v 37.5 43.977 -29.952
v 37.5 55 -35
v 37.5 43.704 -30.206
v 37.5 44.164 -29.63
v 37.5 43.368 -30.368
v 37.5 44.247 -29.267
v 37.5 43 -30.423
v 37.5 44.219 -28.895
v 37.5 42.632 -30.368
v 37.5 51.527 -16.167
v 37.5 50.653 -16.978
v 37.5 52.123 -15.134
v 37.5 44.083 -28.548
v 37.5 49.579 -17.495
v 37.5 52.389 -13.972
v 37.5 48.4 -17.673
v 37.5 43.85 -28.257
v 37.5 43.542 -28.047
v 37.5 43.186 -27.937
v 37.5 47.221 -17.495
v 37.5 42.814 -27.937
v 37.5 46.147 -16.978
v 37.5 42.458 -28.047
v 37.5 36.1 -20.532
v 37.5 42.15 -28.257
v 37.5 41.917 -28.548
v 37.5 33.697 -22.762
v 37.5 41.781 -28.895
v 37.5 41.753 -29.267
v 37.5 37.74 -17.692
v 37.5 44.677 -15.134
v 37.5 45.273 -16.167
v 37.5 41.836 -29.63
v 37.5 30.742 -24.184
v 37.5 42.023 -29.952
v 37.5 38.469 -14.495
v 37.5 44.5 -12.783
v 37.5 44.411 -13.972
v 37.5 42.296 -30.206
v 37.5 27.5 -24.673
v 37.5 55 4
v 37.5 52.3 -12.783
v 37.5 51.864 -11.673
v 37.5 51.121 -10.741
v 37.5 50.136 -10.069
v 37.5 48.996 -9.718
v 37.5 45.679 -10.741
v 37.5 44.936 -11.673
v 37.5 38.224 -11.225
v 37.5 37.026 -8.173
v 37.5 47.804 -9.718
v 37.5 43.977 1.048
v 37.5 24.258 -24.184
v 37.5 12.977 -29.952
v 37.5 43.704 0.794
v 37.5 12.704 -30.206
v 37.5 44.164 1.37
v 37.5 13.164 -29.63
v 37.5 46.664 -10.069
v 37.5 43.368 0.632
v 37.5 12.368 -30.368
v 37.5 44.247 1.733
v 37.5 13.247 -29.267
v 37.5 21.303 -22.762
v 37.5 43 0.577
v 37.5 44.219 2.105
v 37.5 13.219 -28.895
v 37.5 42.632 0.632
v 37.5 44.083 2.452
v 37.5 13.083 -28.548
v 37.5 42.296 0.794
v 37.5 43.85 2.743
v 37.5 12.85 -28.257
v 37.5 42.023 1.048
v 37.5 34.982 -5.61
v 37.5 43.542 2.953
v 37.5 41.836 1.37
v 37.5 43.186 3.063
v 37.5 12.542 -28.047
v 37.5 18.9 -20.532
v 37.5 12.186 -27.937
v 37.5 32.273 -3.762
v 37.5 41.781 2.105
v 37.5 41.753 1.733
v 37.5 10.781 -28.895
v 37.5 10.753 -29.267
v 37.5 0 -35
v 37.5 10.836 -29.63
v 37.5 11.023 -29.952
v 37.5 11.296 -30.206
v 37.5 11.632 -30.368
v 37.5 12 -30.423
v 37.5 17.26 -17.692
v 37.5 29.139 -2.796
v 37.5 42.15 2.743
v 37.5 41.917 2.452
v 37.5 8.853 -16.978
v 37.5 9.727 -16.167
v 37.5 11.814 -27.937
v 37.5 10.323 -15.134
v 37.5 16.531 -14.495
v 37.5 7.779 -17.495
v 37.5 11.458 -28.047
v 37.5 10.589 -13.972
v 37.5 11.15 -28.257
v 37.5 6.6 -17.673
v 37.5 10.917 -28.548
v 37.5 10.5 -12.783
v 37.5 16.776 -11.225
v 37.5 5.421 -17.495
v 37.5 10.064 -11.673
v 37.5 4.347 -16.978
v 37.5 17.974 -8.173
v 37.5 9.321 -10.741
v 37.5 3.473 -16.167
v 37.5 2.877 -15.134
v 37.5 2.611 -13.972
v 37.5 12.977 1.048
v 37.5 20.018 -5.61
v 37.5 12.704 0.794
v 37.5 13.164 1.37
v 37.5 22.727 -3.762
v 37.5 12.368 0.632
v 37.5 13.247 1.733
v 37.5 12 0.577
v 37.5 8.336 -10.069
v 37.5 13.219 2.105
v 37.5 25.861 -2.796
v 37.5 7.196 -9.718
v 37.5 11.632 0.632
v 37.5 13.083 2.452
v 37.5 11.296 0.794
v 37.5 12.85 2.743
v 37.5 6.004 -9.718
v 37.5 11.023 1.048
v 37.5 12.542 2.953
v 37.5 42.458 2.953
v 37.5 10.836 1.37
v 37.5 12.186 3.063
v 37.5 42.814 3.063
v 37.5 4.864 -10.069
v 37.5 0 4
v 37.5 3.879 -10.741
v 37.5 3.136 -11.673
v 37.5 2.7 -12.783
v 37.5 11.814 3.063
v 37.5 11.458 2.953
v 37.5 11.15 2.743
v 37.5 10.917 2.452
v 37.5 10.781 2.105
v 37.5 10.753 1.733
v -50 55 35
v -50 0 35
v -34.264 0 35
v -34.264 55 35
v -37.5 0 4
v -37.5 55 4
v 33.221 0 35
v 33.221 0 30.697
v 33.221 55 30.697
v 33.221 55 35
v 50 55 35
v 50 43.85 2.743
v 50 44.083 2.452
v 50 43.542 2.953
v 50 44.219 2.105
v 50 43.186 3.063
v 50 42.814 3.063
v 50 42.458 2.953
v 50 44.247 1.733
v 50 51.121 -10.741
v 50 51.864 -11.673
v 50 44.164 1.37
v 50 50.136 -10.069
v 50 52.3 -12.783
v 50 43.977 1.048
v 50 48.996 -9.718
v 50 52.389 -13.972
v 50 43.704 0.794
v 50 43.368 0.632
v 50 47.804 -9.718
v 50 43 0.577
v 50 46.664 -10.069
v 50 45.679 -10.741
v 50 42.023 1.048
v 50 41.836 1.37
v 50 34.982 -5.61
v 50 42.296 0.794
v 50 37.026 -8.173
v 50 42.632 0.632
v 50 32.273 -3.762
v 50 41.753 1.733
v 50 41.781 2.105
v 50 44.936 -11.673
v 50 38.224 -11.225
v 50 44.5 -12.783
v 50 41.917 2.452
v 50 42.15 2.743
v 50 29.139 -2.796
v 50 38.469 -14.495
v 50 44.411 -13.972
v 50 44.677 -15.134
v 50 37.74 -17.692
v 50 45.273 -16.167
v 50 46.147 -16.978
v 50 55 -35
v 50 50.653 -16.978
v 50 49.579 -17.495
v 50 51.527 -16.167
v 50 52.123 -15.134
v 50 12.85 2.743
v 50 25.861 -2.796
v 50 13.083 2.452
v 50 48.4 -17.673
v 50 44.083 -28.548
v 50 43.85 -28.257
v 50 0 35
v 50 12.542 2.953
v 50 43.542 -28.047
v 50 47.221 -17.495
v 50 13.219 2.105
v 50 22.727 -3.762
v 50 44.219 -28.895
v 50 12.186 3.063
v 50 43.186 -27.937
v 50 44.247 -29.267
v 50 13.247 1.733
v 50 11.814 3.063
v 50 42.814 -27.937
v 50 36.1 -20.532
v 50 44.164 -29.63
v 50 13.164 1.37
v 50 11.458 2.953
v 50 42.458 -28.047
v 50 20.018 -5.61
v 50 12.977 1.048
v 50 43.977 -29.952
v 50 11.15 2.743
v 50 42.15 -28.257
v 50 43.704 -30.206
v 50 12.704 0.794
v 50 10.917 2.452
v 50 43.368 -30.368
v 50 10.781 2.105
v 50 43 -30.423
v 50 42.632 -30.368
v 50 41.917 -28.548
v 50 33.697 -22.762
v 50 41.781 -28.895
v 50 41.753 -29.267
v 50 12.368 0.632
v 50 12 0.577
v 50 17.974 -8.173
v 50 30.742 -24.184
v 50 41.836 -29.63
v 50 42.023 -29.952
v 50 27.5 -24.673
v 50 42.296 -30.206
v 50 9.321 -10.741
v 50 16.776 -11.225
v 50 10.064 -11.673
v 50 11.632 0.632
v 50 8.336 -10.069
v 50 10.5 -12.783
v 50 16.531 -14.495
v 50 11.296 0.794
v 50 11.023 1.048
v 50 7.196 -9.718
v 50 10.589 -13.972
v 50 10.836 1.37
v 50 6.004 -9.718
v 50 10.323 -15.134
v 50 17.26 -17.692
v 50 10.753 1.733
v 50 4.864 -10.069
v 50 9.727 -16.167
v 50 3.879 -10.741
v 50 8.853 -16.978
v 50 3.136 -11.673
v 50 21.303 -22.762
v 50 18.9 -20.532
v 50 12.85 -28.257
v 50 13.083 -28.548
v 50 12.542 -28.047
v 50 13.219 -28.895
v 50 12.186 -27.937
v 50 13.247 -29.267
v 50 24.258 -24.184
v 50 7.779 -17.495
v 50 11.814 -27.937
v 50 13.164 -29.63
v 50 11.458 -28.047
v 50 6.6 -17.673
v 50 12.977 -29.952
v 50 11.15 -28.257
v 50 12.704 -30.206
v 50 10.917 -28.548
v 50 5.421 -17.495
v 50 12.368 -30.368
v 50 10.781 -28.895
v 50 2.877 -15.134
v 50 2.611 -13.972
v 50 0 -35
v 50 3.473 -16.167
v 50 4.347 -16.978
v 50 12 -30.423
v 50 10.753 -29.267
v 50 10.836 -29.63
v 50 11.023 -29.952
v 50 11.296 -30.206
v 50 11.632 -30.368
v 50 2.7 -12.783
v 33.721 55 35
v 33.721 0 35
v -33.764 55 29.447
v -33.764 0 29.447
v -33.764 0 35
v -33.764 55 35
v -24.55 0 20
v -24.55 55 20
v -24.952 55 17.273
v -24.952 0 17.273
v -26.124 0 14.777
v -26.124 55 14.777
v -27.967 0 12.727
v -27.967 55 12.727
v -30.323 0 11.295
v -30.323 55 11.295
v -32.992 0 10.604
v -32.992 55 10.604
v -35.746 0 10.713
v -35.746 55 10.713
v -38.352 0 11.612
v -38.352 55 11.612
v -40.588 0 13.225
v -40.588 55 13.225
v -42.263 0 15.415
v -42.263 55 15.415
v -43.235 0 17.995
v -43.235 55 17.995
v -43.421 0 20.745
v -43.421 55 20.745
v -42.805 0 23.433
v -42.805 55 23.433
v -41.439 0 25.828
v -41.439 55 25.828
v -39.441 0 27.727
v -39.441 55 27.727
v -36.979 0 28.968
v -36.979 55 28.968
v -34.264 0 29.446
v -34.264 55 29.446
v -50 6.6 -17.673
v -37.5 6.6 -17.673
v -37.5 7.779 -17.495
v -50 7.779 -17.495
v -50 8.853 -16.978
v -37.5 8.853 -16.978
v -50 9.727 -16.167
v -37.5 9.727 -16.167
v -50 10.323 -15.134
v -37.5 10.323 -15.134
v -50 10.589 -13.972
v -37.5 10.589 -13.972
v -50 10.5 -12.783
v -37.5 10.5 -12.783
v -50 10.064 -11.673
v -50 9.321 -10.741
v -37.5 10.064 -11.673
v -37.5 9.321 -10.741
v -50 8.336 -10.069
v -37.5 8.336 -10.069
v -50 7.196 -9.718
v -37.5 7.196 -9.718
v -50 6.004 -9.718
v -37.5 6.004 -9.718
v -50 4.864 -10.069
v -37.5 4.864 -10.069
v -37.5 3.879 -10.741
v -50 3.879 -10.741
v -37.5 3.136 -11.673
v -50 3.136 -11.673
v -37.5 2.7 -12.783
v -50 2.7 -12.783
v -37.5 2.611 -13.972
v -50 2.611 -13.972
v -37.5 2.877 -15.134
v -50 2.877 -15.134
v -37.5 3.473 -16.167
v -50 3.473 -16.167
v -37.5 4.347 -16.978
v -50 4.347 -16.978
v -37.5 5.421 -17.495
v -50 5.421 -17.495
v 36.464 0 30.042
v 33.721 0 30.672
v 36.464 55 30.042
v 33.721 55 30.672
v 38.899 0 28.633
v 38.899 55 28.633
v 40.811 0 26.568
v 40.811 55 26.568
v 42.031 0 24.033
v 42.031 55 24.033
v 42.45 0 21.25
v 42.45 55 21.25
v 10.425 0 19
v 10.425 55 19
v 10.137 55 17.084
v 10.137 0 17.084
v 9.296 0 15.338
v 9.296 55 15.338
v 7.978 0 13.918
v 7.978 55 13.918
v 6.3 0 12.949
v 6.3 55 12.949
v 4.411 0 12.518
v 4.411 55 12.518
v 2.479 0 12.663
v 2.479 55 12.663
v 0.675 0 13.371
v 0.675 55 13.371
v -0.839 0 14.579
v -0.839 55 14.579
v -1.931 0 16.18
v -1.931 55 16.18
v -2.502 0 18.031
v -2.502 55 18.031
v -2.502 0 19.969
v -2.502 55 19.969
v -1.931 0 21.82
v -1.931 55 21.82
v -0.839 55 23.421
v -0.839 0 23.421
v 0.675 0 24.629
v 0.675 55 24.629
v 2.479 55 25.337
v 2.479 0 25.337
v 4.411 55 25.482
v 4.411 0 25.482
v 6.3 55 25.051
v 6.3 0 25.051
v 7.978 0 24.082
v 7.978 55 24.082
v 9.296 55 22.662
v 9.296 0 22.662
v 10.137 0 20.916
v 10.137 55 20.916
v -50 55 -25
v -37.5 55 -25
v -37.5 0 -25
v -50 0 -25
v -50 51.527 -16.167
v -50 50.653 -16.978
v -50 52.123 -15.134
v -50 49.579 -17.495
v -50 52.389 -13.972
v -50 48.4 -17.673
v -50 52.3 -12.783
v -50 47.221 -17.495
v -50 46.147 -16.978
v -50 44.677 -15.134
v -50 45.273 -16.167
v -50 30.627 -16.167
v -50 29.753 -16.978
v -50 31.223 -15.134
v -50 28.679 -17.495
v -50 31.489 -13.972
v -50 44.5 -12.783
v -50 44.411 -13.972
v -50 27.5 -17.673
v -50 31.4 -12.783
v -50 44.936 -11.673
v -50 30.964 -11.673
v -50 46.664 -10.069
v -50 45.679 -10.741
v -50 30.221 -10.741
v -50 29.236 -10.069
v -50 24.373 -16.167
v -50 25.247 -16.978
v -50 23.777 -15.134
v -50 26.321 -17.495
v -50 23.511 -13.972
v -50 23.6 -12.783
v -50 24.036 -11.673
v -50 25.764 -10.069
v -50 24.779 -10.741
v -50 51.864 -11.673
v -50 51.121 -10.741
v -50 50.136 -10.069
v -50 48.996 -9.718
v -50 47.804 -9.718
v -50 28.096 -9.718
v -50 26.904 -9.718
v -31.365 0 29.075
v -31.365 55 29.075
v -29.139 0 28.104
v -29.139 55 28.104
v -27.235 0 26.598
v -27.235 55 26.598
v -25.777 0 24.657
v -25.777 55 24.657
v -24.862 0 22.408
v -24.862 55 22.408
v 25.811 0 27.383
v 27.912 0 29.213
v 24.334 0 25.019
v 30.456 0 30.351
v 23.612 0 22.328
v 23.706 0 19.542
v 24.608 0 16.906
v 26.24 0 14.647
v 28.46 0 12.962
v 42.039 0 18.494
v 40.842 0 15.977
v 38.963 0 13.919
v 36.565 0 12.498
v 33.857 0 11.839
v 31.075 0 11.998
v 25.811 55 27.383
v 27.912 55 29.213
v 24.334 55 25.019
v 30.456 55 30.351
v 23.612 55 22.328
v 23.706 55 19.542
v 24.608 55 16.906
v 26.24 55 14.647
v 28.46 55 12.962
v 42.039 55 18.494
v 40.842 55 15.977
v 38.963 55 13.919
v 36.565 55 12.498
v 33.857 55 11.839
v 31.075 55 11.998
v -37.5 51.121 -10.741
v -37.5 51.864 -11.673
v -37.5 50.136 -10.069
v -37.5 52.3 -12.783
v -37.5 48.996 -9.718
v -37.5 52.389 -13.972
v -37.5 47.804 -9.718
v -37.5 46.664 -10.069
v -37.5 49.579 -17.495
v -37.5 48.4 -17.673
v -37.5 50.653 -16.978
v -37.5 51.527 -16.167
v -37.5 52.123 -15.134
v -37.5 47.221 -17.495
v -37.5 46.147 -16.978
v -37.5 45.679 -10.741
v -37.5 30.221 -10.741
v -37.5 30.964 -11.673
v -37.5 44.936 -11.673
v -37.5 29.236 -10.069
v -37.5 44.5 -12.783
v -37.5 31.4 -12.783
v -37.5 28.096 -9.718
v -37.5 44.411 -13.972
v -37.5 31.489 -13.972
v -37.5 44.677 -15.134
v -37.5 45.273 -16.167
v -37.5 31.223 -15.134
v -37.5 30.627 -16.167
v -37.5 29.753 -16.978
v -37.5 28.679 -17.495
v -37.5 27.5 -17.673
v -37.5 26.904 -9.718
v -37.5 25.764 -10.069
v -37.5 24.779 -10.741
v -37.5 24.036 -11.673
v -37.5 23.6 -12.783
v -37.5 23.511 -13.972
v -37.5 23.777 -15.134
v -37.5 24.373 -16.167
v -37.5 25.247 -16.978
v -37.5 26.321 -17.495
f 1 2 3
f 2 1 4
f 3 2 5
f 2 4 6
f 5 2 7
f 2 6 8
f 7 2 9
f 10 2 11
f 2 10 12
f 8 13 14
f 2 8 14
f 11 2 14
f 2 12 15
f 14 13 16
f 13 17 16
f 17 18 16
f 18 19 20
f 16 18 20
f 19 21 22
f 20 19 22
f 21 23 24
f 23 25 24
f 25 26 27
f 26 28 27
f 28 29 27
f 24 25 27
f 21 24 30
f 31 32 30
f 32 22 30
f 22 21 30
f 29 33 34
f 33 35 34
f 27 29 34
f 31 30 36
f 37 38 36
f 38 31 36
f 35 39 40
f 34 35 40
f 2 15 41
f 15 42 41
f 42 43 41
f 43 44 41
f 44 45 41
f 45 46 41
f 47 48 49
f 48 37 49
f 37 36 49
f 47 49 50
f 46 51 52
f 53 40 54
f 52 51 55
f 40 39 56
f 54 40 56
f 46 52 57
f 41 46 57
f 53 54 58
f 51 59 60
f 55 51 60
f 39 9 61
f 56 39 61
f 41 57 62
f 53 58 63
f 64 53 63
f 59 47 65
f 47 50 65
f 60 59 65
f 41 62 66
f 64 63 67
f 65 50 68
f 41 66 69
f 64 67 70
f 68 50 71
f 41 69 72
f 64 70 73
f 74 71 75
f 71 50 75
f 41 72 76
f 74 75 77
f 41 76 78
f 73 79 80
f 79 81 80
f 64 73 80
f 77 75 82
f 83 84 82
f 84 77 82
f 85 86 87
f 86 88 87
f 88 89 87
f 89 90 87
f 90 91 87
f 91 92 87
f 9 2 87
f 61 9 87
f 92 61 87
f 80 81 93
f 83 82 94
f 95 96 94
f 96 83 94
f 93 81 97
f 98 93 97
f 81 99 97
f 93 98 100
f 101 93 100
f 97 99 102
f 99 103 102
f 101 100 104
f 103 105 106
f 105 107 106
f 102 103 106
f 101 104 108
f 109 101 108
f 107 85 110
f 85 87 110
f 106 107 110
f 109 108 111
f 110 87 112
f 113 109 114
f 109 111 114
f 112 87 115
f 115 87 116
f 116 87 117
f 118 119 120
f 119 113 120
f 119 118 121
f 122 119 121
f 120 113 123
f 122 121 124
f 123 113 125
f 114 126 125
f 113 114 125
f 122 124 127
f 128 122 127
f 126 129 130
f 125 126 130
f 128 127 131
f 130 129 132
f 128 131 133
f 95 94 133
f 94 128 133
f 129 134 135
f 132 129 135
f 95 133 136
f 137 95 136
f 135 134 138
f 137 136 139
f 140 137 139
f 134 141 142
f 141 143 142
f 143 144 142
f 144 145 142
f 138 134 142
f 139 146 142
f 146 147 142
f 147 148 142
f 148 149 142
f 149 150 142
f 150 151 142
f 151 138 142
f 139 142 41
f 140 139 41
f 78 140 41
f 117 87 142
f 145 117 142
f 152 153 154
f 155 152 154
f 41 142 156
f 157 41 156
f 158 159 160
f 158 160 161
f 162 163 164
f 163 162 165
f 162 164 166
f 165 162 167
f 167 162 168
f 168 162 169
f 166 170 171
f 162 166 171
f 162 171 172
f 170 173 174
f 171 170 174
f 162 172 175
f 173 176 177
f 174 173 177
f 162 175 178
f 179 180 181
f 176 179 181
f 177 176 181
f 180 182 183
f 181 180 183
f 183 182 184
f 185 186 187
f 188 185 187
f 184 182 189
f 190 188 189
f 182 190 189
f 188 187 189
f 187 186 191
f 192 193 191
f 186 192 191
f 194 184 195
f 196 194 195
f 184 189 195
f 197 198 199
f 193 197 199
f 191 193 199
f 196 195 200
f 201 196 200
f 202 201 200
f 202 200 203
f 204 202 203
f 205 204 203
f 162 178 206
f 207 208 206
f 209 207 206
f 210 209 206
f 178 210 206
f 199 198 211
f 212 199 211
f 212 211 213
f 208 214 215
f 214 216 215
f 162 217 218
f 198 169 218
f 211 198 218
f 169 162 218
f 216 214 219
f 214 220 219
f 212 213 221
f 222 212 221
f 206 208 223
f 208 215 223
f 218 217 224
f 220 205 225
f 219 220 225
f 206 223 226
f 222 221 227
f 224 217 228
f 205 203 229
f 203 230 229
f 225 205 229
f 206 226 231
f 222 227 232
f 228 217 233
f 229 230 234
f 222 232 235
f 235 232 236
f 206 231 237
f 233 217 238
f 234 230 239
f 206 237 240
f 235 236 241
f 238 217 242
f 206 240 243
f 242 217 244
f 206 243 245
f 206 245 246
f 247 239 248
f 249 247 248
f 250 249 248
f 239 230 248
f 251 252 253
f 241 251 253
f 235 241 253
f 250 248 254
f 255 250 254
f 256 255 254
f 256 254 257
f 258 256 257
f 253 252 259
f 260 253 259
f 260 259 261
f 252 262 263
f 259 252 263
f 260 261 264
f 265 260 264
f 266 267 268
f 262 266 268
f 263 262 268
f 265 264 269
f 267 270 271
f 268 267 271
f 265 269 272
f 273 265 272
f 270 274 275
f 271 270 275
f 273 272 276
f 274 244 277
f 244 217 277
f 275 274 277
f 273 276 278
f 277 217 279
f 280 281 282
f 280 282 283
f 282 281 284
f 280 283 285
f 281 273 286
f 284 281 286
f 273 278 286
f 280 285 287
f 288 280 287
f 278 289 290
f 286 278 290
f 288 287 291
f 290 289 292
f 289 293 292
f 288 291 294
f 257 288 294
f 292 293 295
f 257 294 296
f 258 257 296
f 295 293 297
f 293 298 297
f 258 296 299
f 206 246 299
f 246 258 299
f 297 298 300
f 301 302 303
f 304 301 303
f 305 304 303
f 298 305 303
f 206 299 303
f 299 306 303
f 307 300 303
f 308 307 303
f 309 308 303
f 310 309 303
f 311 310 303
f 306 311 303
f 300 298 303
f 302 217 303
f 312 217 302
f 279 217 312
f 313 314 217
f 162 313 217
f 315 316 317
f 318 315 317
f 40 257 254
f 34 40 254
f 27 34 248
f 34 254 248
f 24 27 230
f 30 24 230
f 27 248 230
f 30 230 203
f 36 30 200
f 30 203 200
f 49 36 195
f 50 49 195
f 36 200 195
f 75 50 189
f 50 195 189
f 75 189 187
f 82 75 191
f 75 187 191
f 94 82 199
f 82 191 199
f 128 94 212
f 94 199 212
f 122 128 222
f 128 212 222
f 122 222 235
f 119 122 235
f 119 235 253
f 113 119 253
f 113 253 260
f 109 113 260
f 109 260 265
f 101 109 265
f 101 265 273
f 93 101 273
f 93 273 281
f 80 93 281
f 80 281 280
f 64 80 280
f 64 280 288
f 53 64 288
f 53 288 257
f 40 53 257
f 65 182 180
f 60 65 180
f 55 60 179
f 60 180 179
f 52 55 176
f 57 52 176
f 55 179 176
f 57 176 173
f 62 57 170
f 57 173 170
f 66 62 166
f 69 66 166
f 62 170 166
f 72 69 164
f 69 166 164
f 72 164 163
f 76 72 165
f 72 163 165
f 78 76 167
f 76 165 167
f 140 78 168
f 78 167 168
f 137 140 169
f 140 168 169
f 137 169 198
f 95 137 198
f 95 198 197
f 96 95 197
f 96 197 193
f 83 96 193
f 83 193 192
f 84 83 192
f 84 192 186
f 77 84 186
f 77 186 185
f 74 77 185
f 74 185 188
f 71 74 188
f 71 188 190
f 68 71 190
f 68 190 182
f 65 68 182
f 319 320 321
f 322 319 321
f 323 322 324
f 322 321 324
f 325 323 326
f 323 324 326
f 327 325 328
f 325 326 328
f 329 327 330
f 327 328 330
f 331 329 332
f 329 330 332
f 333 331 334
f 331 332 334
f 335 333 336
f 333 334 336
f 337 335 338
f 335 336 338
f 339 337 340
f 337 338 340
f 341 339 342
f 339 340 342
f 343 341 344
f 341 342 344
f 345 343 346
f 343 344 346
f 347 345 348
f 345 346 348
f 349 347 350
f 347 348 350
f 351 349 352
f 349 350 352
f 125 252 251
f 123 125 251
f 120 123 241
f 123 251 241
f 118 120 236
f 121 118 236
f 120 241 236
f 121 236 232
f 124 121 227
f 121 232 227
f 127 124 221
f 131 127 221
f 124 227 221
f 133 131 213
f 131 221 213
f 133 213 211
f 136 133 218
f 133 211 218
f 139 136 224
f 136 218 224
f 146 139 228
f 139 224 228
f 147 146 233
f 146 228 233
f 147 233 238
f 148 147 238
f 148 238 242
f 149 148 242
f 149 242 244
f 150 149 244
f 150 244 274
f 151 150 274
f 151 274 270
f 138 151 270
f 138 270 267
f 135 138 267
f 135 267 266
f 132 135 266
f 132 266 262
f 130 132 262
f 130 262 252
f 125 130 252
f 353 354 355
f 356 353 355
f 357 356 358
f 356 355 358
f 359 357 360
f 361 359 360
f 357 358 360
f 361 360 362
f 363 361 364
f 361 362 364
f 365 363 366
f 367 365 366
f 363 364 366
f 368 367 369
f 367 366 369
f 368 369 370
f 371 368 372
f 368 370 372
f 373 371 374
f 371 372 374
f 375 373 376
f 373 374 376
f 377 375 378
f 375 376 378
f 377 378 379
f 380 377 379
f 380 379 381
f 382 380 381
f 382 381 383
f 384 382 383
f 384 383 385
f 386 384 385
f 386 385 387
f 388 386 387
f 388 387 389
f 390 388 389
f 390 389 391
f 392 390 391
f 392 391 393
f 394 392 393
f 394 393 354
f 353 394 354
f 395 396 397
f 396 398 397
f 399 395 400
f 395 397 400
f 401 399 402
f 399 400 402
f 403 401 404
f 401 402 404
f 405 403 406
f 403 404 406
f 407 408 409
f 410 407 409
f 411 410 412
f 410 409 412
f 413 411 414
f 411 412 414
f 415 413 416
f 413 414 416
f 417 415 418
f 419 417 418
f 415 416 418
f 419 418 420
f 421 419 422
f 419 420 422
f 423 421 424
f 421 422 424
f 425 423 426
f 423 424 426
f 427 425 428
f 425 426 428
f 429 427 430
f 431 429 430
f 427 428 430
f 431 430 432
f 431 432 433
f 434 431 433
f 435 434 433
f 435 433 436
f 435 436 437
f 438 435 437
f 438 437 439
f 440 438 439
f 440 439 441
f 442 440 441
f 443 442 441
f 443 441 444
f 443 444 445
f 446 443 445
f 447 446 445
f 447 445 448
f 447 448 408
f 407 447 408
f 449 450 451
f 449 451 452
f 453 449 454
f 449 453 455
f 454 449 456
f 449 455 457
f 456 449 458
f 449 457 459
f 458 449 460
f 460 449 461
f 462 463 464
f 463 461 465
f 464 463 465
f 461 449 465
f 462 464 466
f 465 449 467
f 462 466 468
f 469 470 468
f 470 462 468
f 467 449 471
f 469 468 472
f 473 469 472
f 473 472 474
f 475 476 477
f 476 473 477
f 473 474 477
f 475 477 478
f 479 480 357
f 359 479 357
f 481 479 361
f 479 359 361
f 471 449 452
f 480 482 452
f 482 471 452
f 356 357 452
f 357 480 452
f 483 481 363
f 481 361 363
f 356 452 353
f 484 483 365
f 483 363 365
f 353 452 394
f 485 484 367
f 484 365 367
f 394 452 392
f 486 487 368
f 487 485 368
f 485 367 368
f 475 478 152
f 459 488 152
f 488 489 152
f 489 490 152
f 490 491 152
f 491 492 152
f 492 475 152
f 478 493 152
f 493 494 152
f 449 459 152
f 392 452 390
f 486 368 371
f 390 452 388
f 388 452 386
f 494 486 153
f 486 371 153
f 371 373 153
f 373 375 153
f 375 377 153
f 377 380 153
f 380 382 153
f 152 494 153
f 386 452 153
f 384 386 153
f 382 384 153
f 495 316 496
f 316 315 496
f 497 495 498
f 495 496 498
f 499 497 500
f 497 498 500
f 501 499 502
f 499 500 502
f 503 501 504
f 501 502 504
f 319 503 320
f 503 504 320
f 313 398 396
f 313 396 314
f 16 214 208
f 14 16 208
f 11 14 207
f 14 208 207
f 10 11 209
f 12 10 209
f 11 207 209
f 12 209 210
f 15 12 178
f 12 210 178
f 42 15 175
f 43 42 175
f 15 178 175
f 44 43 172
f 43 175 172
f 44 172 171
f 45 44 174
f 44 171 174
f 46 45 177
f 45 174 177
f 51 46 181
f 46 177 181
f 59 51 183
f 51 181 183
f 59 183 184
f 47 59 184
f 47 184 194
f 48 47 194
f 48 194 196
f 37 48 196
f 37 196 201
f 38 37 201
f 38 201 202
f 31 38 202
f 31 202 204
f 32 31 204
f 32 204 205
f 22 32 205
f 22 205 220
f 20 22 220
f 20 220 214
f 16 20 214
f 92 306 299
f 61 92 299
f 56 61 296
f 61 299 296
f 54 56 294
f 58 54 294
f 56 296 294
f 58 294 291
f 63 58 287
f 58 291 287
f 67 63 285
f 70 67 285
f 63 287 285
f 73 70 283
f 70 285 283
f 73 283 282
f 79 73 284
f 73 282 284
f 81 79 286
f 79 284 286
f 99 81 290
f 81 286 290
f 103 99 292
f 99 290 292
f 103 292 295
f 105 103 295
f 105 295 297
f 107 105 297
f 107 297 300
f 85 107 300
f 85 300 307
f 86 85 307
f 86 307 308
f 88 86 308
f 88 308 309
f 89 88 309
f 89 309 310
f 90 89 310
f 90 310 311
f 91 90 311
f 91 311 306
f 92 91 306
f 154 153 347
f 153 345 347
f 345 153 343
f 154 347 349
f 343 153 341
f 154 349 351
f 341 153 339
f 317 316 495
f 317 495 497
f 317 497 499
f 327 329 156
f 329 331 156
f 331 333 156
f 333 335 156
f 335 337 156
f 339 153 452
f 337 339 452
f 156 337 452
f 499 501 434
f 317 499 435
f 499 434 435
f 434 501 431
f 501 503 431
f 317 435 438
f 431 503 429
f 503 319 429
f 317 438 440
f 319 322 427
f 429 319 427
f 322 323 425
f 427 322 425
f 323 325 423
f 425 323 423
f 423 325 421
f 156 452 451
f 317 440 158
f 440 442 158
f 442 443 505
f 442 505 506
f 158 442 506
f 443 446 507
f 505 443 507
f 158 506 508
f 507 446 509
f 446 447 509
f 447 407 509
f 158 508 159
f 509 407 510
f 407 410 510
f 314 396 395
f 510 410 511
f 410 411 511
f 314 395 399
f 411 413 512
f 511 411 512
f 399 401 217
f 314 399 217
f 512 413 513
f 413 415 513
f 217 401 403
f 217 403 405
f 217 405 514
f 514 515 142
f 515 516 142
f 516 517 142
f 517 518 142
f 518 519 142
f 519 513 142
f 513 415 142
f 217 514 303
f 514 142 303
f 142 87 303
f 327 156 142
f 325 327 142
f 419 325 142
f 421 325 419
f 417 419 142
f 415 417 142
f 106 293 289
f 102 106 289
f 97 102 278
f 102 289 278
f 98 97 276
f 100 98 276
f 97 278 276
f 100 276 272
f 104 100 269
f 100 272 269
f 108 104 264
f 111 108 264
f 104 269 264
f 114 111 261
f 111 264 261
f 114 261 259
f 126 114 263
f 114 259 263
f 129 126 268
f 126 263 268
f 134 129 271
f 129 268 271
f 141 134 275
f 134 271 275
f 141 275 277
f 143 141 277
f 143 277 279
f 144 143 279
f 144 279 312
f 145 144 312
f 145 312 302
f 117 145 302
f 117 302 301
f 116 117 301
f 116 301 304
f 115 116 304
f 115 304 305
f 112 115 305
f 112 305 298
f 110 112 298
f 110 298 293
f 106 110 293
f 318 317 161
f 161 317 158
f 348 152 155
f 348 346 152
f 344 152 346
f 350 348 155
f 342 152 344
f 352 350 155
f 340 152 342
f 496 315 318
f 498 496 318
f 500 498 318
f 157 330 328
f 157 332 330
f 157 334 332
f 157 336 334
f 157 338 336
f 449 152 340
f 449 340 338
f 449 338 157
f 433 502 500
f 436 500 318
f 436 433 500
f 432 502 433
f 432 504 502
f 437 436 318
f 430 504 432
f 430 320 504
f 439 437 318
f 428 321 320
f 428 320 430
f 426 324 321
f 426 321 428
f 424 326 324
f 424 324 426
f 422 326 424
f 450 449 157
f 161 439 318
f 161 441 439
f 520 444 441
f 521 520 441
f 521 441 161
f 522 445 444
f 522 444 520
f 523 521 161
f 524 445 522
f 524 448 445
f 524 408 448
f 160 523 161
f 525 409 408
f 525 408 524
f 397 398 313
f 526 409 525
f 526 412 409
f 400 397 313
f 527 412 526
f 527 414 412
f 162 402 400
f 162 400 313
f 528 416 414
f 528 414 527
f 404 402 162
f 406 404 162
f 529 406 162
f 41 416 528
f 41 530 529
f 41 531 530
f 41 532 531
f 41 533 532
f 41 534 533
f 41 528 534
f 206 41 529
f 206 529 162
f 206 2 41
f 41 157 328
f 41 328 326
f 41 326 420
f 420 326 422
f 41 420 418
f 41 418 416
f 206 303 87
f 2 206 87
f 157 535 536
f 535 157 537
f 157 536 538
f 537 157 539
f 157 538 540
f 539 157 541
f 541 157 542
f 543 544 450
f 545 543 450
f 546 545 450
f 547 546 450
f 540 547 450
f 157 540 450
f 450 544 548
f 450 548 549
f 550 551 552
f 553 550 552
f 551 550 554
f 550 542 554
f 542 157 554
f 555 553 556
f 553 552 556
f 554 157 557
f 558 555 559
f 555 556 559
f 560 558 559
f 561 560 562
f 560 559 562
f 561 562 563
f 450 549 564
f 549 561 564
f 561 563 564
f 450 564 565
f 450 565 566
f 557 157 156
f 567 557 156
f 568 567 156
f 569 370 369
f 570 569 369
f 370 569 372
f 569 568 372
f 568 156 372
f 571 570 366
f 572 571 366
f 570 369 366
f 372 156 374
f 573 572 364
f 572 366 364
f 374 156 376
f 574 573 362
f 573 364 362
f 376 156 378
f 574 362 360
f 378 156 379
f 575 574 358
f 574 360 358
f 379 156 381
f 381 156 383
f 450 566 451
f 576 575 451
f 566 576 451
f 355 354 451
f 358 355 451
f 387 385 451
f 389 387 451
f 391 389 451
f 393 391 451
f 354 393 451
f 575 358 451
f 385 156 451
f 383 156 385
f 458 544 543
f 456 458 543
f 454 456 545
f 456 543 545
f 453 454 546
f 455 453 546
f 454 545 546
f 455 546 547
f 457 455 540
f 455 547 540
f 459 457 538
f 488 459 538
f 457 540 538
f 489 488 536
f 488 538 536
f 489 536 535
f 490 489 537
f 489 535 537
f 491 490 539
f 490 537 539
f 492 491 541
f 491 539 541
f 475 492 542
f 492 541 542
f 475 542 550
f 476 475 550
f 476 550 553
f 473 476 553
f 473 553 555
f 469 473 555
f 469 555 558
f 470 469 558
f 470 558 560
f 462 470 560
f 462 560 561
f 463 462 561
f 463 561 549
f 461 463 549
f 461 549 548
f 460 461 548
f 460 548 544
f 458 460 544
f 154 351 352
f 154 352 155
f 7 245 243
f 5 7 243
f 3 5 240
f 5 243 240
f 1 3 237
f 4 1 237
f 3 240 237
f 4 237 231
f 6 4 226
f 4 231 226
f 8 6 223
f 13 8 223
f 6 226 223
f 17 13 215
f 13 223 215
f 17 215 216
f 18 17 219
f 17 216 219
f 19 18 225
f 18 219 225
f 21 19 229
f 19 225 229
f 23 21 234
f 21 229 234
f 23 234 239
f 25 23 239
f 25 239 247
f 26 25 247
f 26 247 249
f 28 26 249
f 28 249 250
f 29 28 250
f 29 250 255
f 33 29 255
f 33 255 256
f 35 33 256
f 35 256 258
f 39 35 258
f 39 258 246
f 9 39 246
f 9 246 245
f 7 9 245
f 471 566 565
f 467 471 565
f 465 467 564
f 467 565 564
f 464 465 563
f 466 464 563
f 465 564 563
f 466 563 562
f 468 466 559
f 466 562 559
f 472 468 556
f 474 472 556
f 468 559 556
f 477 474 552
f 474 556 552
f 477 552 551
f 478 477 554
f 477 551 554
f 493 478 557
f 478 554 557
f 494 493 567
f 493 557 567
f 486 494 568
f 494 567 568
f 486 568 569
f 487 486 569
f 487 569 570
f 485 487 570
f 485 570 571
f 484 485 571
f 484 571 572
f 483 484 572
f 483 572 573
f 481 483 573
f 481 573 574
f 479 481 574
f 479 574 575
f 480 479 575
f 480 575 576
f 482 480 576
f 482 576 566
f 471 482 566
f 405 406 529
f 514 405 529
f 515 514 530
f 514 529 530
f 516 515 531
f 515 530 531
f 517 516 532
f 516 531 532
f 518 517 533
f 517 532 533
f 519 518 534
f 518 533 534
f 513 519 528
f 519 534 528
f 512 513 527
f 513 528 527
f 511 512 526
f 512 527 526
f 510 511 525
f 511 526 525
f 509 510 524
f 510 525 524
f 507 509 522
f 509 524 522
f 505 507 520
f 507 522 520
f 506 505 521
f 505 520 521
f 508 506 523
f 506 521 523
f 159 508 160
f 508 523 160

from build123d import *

# Parameters (mm, degrees)
BOSS_EXTRUDE1_DEPTH     = 55
SKETCH2_W               = 12.5
SKETCH2_H               = 55
CUT_EXTRUDE1_DEPTH      = 10
SKETCH4_R               = 9.45
CUT_EXTRUDE2_DEPTH      = 56
SKETCH5_R               = 9.45
CUT_EXTRUDE3_DEPTH      = 56
SKETCH7_R               = 1.25
CUT_EXTRUDE5_DEPTH      = 35
SKETCH8_R               = 11
CUT_EXTRUDE6_DEPTH      = 35
SKETCH9_R               = 4
CUT_EXTRUDE7_DEPTH      = 1
CUT_EXTRUDE7_DEPTH_BACK = 101
SKETCH11_R              = 4
CUT_EXTRUDE8_DEPTH      = 100
SKETCH12_W              = 0.5
SKETCH12_H              = 7.437726557
SKETCH12_H_2            = 9.137996941
CUT_EXTRUDE9_DEPTH      = 56
SKETCH13_R              = 6.5
CUT_EXTRUDE10_DEPTH     = 56


with BuildPart() as part:
    # Sketch1 → Boss-Extrude1 (new body)
    with BuildSketch(Plane(origin=(0, 0, 0), x_dir=(1, 0, 0), z_dir=(0, 1, 0))):
        Polygon((-37.5, 35), (-50, 35), (-50, -35), (50, -35), (50, 35), (37.5, 35), (37.5, -4), (-37.5, -4), align=None)
    extrude(amount=BOSS_EXTRUDE1_DEPTH)

    # Sketch2 → Cut-Extrude1 (cut)
    with BuildSketch(Plane(origin=(0, 0, -35), x_dir=(-1, 0, 0), z_dir=(0, 0, -1))):
        with Locations((43.75, 27.5)):
            Rectangle(SKETCH2_W, SKETCH2_H)
    extrude(amount=-CUT_EXTRUDE1_DEPTH, mode=Mode.SUBTRACT)

    # Sketch4 → Cut-Extrude2 (cut, through all)
    with BuildSketch(Plane(origin=(0, 55, 0), x_dir=(1, 0, 0), z_dir=(0, 1, 0))):
        with Locations((33, -21.25)):
            Circle(SKETCH4_R)
    extrude(amount=-CUT_EXTRUDE2_DEPTH, mode=Mode.SUBTRACT)

    # Sketch5 → Cut-Extrude3 (cut, through all)
    with BuildSketch(Plane(origin=(0, 55, 0), x_dir=(1, 0, 0), z_dir=(0, 1, 0))):
        with Locations((-34, -20)):
            Circle(SKETCH5_R)
    extrude(amount=-CUT_EXTRUDE3_DEPTH, mode=Mode.SUBTRACT)

    # Sketch7 → Cut-Extrude5 (cut)
    with BuildSketch(Plane(origin=(50, 0, 0), x_dir=(0, 0, -1), z_dir=(1, 0, 0))):
        with Locations((29.173129307, 12)):
            Circle(SKETCH7_R)
        with Locations((-1.826870693, 12)):
            Circle(SKETCH7_R)
        with Locations((-1.826870693, 43)):
            Circle(SKETCH7_R)
        with Locations((29.173129307, 43)):
            Circle(SKETCH7_R)
    extrude(amount=-CUT_EXTRUDE5_DEPTH, mode=Mode.SUBTRACT)

    # Sketch8 → Cut-Extrude6 (cut)
    with BuildSketch(Plane(origin=(50, 0, 0), x_dir=(0, 0, -1), z_dir=(1, 0, 0))):
        with Locations((13.673129307, 27.5)):
            Circle(SKETCH8_R)
    extrude(amount=-CUT_EXTRUDE6_DEPTH, mode=Mode.SUBTRACT)

    # Sketch9 → Cut-Extrude7 (cut, two sides)
    with BuildSketch(Plane(origin=(50, 0, 0), x_dir=(0, 0, -1), z_dir=(1, 0, 0))) as cut_extrude7_sk:
        with Locations((13.673129307, 48.4)):
            Circle(SKETCH9_R)
        with Locations((13.673129307, 6.6)):
            Circle(SKETCH9_R)
    extrude(amount=CUT_EXTRUDE7_DEPTH, mode=Mode.SUBTRACT)
    extrude(cut_extrude7_sk.sketch, amount=-CUT_EXTRUDE7_DEPTH_BACK, mode=Mode.SUBTRACT)

    # Sketch11 → Cut-Extrude8 (cut)
    with BuildSketch(Plane(origin=(-37.5, 0, 0), x_dir=(0, 0, -1), z_dir=(1, 0, 0))):
        with Locations((13.673129307, 27.5)):
            Circle(SKETCH11_R)
    extrude(amount=-CUT_EXTRUDE8_DEPTH, mode=Mode.SUBTRACT)

    # Sketch12 → Cut-Extrude9 (cut, through all)
    with BuildSketch(Plane.XZ):
        with Locations((33.471458783, 32.290249866)):
            Rectangle(SKETCH12_W, SKETCH12_H)
        with Locations((-34.014056432, 31.597087229)):
            Rectangle(SKETCH12_W, SKETCH12_H_2)
    extrude(amount=-CUT_EXTRUDE9_DEPTH, mode=Mode.SUBTRACT)

    # Sketch13 → Cut-Extrude10 (cut, through all)
    with BuildSketch(Plane(origin=(0, 55, 0), x_dir=(1, 0, 0), z_dir=(0, 1, 0))):
        with Locations((3.925383248, -19)):
            Circle(SKETCH13_R)
    extrude(amount=-CUT_EXTRUDE10_DEPTH, mode=Mode.SUBTRACT)


solid = part.part
